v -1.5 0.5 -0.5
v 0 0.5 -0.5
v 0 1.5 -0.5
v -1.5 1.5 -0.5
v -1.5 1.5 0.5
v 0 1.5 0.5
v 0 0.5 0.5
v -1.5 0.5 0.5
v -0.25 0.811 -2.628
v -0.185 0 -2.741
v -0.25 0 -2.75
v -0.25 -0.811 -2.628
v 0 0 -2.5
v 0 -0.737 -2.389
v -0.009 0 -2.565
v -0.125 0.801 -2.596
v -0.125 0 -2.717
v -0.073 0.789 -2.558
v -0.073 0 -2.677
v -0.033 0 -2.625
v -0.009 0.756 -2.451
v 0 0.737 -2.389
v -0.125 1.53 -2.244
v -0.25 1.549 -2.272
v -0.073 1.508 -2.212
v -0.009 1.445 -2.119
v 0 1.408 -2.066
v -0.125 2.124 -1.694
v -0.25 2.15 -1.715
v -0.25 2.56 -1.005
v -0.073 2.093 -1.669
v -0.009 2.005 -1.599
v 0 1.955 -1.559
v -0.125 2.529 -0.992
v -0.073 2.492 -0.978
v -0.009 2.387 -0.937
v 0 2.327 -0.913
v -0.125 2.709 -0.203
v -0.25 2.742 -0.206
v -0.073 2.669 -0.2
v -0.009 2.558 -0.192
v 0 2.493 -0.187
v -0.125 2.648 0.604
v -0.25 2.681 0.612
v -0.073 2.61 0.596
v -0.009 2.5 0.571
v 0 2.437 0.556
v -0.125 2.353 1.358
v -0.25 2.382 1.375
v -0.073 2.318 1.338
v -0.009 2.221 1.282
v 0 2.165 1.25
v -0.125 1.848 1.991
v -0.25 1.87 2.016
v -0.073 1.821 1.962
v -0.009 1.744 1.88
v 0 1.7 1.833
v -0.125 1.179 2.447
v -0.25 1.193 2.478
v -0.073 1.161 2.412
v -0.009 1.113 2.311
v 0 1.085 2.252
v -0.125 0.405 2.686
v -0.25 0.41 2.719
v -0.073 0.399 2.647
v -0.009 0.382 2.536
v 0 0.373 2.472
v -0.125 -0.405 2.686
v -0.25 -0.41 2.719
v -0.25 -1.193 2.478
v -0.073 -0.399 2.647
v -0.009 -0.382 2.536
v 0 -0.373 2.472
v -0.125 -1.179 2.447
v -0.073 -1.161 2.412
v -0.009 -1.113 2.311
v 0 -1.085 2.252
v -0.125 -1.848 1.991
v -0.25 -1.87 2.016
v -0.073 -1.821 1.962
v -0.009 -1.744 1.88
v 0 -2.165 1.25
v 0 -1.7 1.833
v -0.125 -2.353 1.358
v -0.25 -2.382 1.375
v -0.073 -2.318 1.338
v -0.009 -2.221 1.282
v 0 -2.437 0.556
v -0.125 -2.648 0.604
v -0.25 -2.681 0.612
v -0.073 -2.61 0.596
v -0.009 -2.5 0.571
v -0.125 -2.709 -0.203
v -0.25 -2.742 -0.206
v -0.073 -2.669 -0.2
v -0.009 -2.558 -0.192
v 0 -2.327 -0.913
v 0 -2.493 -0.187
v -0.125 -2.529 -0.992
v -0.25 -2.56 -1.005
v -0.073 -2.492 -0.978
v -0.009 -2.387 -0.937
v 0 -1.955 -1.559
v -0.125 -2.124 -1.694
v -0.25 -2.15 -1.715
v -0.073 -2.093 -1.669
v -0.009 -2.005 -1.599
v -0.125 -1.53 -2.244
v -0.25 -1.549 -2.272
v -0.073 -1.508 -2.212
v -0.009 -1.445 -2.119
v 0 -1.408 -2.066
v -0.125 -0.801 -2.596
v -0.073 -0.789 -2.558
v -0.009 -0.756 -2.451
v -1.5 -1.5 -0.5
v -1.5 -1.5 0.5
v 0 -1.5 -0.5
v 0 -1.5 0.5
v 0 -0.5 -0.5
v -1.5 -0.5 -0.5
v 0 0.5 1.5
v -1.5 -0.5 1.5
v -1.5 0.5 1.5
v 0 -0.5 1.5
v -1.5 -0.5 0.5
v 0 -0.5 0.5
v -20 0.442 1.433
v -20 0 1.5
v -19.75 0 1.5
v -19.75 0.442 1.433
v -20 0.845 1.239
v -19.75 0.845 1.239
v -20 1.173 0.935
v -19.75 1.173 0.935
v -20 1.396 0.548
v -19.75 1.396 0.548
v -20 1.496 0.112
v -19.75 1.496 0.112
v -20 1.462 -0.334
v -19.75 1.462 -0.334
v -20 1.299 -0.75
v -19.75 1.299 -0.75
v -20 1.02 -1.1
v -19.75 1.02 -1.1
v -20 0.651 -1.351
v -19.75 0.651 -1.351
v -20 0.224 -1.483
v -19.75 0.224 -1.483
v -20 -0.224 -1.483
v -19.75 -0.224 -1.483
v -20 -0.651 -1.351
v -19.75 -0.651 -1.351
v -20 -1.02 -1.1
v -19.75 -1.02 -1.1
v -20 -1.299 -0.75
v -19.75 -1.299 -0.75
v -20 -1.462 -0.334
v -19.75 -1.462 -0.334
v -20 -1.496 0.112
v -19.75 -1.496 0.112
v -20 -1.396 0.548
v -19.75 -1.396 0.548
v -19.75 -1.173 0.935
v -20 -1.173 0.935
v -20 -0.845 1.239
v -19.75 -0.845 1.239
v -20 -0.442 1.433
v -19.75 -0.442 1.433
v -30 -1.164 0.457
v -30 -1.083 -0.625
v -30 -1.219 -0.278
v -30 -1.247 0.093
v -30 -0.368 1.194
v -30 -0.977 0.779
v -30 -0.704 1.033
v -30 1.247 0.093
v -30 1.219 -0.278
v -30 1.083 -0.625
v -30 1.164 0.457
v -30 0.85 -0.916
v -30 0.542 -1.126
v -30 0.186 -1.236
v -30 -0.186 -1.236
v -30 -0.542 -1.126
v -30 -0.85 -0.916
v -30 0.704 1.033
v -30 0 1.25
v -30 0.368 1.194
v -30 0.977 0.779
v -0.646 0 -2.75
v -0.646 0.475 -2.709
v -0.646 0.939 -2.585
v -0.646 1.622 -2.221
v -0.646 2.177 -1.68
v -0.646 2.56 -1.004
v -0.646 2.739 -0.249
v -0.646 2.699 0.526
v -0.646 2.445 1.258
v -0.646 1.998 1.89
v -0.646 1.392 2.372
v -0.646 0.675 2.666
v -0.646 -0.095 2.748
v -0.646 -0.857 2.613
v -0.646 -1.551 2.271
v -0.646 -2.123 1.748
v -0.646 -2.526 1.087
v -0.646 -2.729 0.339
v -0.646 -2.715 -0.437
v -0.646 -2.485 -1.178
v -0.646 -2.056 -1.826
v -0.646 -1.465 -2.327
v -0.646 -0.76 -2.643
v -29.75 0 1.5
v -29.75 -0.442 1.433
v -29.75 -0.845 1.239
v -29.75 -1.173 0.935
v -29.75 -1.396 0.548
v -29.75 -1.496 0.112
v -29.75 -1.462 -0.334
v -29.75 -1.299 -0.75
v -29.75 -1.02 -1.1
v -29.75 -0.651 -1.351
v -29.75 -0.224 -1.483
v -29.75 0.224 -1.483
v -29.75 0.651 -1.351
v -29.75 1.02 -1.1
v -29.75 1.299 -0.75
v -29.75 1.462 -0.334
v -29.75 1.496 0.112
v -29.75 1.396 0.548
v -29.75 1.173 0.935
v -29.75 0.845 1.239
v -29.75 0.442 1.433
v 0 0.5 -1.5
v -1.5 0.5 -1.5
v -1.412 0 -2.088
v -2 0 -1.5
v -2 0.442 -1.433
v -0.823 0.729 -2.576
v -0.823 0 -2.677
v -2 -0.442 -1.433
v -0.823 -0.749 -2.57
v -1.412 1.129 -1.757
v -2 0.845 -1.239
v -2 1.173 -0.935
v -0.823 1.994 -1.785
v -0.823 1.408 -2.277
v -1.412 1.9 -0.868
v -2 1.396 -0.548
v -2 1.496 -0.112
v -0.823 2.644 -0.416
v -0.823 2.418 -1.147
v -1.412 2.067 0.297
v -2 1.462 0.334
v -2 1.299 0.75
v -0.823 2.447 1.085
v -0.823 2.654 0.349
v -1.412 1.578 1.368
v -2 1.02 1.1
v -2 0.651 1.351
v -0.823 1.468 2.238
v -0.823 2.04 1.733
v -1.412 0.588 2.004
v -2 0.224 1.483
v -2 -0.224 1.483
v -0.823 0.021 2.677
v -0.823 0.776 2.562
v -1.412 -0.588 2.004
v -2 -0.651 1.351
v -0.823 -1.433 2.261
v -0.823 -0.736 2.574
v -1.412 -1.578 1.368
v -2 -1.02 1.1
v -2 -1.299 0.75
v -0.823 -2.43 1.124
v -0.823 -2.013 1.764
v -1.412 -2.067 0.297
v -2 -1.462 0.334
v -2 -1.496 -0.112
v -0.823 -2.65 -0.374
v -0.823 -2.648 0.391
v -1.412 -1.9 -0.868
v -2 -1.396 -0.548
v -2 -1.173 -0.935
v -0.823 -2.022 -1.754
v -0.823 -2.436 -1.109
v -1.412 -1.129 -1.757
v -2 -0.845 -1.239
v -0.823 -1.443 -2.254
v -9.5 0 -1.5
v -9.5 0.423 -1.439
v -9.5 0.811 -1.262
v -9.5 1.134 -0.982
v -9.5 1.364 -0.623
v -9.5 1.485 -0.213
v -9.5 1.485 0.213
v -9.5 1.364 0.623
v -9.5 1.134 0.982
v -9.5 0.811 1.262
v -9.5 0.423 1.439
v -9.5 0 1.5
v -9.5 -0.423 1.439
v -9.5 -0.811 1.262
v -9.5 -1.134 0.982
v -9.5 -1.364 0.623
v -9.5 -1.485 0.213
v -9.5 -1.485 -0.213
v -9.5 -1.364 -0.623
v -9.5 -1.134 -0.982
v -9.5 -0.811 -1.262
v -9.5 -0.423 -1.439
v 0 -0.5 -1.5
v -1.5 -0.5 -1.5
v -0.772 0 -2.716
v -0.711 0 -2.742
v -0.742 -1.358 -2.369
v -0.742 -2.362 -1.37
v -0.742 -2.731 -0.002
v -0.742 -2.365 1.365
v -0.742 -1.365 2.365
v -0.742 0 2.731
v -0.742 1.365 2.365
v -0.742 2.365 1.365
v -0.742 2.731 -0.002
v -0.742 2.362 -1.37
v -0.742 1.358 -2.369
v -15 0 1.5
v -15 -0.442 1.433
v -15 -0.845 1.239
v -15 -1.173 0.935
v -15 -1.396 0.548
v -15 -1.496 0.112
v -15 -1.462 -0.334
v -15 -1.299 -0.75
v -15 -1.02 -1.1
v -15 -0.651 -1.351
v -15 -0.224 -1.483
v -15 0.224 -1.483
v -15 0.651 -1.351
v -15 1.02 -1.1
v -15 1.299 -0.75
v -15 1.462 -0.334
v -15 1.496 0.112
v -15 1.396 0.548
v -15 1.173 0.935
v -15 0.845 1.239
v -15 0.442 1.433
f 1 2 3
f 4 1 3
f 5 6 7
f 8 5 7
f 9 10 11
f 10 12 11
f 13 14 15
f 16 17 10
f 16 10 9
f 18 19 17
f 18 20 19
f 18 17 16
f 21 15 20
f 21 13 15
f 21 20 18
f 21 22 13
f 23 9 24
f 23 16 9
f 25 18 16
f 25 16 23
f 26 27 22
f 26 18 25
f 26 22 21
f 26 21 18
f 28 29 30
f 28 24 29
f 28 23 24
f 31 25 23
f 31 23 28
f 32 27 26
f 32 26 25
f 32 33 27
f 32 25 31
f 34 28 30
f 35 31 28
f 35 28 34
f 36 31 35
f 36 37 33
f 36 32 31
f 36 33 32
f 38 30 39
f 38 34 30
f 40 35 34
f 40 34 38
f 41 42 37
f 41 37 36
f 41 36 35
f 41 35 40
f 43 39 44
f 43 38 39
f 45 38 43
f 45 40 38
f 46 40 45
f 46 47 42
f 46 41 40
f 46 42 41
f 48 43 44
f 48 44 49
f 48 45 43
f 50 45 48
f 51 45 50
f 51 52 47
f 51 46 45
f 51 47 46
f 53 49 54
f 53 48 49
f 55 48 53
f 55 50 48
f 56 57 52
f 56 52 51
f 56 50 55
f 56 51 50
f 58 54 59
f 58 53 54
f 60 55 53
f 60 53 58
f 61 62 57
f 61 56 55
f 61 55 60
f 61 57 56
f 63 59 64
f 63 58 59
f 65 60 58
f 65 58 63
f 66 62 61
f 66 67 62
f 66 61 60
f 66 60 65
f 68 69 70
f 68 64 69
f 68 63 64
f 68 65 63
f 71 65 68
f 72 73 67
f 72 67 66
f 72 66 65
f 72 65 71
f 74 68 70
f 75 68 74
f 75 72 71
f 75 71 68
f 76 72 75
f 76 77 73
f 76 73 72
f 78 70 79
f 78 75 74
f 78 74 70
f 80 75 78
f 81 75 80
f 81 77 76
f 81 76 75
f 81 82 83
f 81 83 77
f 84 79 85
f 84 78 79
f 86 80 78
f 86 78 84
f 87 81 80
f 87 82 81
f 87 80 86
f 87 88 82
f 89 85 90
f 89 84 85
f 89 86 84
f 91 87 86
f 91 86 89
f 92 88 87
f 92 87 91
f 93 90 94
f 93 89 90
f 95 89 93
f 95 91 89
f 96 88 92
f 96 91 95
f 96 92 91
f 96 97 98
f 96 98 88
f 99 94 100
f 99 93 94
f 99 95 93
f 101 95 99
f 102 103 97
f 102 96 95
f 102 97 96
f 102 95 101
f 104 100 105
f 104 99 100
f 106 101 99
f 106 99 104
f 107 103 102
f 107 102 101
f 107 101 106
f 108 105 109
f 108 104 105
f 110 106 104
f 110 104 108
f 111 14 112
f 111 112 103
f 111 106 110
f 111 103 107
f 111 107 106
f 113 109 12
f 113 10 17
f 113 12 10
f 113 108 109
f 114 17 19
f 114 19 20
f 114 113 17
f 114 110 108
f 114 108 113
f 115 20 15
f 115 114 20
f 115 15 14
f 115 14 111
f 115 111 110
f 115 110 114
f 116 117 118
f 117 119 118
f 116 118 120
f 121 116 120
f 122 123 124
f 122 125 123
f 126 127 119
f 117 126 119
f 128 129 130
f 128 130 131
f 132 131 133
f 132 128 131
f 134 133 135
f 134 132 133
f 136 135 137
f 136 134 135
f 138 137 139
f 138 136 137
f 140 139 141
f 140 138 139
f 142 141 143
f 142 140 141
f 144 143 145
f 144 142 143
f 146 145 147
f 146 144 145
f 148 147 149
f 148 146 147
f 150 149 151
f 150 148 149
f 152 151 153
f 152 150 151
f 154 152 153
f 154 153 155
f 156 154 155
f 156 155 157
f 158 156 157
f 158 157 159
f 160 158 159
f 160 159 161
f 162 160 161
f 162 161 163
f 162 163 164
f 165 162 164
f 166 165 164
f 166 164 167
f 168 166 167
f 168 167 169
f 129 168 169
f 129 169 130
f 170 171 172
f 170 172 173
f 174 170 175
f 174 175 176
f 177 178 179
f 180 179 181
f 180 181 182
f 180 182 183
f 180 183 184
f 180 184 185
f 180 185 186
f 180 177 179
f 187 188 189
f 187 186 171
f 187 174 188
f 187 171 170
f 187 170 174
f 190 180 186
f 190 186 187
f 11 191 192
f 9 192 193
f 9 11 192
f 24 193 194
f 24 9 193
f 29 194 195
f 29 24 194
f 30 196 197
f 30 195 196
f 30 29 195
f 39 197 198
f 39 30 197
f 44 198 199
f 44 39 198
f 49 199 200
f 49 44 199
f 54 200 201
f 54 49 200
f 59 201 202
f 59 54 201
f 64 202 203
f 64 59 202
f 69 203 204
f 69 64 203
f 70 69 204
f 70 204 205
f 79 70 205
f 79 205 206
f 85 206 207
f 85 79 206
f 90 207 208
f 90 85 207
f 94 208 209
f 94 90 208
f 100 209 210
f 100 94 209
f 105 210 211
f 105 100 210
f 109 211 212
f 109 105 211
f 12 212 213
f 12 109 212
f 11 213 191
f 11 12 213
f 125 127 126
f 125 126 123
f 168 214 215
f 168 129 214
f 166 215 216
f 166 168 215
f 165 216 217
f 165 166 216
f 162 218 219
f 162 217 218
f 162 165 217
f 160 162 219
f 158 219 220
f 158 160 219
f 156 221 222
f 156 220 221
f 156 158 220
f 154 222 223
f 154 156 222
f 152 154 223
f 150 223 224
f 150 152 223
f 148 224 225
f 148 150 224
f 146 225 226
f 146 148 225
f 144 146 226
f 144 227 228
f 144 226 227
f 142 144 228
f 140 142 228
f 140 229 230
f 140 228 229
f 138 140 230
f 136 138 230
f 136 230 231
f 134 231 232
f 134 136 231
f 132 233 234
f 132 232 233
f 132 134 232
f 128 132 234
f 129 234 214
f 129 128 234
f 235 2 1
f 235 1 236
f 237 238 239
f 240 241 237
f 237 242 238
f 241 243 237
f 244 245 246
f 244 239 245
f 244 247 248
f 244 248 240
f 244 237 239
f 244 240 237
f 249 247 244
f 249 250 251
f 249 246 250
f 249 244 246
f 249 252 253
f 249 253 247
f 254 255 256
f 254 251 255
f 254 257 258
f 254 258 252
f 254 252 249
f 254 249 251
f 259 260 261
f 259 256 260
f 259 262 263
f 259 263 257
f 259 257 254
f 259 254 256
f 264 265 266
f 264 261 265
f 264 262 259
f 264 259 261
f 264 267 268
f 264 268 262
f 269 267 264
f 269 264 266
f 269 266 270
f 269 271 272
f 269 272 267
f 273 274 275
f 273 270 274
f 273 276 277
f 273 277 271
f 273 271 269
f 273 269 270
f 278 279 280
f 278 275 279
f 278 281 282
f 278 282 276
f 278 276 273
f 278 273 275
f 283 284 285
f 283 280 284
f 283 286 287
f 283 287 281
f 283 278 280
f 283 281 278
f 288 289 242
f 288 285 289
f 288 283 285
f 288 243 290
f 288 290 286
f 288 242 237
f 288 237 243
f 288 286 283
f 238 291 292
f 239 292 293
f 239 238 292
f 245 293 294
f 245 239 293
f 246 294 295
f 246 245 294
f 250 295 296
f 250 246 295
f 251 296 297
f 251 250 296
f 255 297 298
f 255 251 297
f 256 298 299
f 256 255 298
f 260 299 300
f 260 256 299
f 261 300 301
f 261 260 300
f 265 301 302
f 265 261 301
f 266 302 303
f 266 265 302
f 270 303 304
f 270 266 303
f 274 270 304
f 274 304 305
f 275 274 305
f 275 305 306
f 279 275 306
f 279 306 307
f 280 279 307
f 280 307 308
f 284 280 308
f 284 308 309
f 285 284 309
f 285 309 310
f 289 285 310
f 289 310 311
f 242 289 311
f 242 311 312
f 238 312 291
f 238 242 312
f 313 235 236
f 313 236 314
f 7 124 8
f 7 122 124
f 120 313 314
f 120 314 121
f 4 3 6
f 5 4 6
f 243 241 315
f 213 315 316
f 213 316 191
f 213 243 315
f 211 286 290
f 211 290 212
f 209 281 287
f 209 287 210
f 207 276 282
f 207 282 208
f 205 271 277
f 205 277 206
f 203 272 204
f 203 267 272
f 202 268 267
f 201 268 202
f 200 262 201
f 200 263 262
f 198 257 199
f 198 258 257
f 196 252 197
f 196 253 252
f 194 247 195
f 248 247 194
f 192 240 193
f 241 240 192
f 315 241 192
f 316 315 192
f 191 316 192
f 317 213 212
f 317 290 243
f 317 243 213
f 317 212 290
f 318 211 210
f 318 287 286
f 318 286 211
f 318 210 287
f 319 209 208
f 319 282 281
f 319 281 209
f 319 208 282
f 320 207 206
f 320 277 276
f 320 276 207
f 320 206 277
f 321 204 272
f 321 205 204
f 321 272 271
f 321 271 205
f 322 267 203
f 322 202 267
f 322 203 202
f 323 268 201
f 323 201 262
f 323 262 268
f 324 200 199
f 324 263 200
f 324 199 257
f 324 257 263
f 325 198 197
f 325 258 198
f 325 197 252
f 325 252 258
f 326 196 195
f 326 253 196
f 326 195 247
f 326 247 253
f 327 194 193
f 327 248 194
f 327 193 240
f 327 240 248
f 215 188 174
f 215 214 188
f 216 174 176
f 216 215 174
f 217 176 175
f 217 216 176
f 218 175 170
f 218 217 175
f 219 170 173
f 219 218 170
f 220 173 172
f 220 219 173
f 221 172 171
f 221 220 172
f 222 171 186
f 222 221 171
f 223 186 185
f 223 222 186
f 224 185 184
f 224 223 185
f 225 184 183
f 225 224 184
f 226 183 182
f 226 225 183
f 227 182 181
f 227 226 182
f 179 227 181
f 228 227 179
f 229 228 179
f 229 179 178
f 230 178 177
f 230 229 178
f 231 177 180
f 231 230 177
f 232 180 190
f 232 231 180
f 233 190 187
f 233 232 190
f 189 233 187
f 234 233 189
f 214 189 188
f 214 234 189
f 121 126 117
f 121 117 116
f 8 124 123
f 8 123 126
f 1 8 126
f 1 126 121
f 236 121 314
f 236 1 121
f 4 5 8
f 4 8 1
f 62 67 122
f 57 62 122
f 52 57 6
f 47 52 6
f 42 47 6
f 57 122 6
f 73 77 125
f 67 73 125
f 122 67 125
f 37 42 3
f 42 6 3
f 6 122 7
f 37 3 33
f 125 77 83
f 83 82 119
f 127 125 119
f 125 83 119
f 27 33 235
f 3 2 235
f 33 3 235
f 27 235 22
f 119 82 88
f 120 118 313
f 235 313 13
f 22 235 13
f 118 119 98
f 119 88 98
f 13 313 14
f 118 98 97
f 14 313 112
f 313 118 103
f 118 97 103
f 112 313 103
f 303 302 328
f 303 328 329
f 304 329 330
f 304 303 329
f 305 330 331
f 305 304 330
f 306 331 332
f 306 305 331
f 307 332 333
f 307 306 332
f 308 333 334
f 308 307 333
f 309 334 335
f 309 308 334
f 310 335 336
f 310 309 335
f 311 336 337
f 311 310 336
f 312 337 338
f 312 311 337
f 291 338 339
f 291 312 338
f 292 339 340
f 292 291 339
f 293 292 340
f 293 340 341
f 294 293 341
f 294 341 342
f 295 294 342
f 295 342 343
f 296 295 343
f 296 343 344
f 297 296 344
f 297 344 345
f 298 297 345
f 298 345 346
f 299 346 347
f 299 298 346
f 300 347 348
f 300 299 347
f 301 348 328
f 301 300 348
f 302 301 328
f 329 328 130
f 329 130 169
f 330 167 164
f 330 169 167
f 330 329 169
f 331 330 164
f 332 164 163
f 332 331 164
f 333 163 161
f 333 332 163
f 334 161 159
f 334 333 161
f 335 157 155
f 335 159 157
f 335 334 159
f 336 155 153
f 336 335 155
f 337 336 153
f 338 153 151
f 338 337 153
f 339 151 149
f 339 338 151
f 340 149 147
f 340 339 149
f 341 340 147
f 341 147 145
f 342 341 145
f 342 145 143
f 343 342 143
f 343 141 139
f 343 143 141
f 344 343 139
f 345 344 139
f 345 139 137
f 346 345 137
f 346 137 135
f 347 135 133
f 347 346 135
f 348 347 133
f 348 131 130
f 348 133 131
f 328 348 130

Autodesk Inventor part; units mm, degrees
ref_plane "YZ Plane" through (0, 0, 0) normal (1, 0, 0) x (0, 1, 0)
ref_plane "XZ Plane" through (0, 0, 0) normal (0, 1, 0) x (-1, 0, 0)
ref_plane "XY Plane" through (0, 0, 0) normal (0, 0, 1) x (1, 0, 0)
sketch "Sketch1" plane through (0, 0, 0) normal (0, 1, 0) x (-1, 0, 0)
  line L0 (0, 0) -> (0, -2.75)
  line L1 (0, 0) -> (9.5, 0)
  line L2 (9.5, 0) -> (9.5, -1.5)
  line L3 (9.5, -1.5) -> (2, -1.5)
  line L4 (2, -1.5) -> (0.75, -2.75)
  line L5 (2, -1.5) -> (3.7678, -1.5) construction
  line L6 (0.75, -2.75) -> (0, -2.75)
  dimension "d0" = 2.75
  dimension "d1" = 9.5
  dimension "d2" = 1.5
  dimension "d3" = 7.5
  dimension "d4" = 135
revolve "Revolution1" add sketch "Sketch1" angle 360 about axis through (0, 0, 0) along (-1, 0, 0)
fillet "Fillet1" radius 0.25 2 edges at (-0.75, 0, 2.75) (0, 0, 2.75)
sketch "Sketch2" plane through (0, 0, 0) normal (1, 0, 0) x (0, 0, -1)
  line L0 (-1.5, 0.5) -> (1.5, 0.5)
  line L1 (1.5, 0.5) -> (1.5, -0.5)
  line L2 (1.5, -0.5) -> (-1.5, -0.5)
  line L3 (-1.5, -0.5) -> (-1.5, 0.5)
  line L4 (-1.5, 0.5) -> (1.5, -0.5) construction
  line L5 (1.5, 0.5) -> (-1.5, -0.5) construction
  line L6 (0.5, 1.5) -> (-0.5, 1.5)
  line L7 (-0.5, 1.5) -> (-0.5, -1.5)
  line L8 (-0.5, -1.5) -> (0.5, -1.5)
  line L9 (0.5, -1.5) -> (0.5, 1.5)
  line L10 (0.5, 1.5) -> (-0.5, -1.5) construction
  line L11 (-0.5, 1.5) -> (0.5, -1.5) construction
  point P0 (0, 0)
  point P1 (0.5, 0.5)
  point P2 (-0.5, 0.5)
  point P3 (-0.5, -0.5)
  point P4 (0.5, -0.5)
  dimension "d9" = 3
  dimension "d10" = 1
  dimension "d11" = 1
  dimension "d12" = 3
extrude "Extrusion1" cut sketch "Sketch2" against normal blind 1.5
sketch "Sketch3" plane through (-9.5, 0, 0) normal (-1, 0, 0) x (0, 0, 1)
  circle A0 centre (0, 0) radius 1.5
extrude "Extrusion2" add sketch "Sketch3" along normal blind 10.5
thread "Thread2" size "M3x0.5" class "6g" standard "ANSI Metric M Profile" full length
chamfer "Chamfer2" distance 0.25 angle 45 1 edges at (-20, 0, -1.5)
sketch "Sketch4" plane through (-20, 0, 0) normal (-1, 0, 0) x (0, 0, 1)
  circle A0 centre (0, 0) radius 1.5
extrude "Extrusion3" add sketch "Sketch4" along normal blind 10 and the other way blind 5
chamfer "Chamfer3" distance 0.25 angle 45 1 edges at (-30, 0, -1.5)
properties part number "M3_Long_Bolt" material "Steel, Alloy"
